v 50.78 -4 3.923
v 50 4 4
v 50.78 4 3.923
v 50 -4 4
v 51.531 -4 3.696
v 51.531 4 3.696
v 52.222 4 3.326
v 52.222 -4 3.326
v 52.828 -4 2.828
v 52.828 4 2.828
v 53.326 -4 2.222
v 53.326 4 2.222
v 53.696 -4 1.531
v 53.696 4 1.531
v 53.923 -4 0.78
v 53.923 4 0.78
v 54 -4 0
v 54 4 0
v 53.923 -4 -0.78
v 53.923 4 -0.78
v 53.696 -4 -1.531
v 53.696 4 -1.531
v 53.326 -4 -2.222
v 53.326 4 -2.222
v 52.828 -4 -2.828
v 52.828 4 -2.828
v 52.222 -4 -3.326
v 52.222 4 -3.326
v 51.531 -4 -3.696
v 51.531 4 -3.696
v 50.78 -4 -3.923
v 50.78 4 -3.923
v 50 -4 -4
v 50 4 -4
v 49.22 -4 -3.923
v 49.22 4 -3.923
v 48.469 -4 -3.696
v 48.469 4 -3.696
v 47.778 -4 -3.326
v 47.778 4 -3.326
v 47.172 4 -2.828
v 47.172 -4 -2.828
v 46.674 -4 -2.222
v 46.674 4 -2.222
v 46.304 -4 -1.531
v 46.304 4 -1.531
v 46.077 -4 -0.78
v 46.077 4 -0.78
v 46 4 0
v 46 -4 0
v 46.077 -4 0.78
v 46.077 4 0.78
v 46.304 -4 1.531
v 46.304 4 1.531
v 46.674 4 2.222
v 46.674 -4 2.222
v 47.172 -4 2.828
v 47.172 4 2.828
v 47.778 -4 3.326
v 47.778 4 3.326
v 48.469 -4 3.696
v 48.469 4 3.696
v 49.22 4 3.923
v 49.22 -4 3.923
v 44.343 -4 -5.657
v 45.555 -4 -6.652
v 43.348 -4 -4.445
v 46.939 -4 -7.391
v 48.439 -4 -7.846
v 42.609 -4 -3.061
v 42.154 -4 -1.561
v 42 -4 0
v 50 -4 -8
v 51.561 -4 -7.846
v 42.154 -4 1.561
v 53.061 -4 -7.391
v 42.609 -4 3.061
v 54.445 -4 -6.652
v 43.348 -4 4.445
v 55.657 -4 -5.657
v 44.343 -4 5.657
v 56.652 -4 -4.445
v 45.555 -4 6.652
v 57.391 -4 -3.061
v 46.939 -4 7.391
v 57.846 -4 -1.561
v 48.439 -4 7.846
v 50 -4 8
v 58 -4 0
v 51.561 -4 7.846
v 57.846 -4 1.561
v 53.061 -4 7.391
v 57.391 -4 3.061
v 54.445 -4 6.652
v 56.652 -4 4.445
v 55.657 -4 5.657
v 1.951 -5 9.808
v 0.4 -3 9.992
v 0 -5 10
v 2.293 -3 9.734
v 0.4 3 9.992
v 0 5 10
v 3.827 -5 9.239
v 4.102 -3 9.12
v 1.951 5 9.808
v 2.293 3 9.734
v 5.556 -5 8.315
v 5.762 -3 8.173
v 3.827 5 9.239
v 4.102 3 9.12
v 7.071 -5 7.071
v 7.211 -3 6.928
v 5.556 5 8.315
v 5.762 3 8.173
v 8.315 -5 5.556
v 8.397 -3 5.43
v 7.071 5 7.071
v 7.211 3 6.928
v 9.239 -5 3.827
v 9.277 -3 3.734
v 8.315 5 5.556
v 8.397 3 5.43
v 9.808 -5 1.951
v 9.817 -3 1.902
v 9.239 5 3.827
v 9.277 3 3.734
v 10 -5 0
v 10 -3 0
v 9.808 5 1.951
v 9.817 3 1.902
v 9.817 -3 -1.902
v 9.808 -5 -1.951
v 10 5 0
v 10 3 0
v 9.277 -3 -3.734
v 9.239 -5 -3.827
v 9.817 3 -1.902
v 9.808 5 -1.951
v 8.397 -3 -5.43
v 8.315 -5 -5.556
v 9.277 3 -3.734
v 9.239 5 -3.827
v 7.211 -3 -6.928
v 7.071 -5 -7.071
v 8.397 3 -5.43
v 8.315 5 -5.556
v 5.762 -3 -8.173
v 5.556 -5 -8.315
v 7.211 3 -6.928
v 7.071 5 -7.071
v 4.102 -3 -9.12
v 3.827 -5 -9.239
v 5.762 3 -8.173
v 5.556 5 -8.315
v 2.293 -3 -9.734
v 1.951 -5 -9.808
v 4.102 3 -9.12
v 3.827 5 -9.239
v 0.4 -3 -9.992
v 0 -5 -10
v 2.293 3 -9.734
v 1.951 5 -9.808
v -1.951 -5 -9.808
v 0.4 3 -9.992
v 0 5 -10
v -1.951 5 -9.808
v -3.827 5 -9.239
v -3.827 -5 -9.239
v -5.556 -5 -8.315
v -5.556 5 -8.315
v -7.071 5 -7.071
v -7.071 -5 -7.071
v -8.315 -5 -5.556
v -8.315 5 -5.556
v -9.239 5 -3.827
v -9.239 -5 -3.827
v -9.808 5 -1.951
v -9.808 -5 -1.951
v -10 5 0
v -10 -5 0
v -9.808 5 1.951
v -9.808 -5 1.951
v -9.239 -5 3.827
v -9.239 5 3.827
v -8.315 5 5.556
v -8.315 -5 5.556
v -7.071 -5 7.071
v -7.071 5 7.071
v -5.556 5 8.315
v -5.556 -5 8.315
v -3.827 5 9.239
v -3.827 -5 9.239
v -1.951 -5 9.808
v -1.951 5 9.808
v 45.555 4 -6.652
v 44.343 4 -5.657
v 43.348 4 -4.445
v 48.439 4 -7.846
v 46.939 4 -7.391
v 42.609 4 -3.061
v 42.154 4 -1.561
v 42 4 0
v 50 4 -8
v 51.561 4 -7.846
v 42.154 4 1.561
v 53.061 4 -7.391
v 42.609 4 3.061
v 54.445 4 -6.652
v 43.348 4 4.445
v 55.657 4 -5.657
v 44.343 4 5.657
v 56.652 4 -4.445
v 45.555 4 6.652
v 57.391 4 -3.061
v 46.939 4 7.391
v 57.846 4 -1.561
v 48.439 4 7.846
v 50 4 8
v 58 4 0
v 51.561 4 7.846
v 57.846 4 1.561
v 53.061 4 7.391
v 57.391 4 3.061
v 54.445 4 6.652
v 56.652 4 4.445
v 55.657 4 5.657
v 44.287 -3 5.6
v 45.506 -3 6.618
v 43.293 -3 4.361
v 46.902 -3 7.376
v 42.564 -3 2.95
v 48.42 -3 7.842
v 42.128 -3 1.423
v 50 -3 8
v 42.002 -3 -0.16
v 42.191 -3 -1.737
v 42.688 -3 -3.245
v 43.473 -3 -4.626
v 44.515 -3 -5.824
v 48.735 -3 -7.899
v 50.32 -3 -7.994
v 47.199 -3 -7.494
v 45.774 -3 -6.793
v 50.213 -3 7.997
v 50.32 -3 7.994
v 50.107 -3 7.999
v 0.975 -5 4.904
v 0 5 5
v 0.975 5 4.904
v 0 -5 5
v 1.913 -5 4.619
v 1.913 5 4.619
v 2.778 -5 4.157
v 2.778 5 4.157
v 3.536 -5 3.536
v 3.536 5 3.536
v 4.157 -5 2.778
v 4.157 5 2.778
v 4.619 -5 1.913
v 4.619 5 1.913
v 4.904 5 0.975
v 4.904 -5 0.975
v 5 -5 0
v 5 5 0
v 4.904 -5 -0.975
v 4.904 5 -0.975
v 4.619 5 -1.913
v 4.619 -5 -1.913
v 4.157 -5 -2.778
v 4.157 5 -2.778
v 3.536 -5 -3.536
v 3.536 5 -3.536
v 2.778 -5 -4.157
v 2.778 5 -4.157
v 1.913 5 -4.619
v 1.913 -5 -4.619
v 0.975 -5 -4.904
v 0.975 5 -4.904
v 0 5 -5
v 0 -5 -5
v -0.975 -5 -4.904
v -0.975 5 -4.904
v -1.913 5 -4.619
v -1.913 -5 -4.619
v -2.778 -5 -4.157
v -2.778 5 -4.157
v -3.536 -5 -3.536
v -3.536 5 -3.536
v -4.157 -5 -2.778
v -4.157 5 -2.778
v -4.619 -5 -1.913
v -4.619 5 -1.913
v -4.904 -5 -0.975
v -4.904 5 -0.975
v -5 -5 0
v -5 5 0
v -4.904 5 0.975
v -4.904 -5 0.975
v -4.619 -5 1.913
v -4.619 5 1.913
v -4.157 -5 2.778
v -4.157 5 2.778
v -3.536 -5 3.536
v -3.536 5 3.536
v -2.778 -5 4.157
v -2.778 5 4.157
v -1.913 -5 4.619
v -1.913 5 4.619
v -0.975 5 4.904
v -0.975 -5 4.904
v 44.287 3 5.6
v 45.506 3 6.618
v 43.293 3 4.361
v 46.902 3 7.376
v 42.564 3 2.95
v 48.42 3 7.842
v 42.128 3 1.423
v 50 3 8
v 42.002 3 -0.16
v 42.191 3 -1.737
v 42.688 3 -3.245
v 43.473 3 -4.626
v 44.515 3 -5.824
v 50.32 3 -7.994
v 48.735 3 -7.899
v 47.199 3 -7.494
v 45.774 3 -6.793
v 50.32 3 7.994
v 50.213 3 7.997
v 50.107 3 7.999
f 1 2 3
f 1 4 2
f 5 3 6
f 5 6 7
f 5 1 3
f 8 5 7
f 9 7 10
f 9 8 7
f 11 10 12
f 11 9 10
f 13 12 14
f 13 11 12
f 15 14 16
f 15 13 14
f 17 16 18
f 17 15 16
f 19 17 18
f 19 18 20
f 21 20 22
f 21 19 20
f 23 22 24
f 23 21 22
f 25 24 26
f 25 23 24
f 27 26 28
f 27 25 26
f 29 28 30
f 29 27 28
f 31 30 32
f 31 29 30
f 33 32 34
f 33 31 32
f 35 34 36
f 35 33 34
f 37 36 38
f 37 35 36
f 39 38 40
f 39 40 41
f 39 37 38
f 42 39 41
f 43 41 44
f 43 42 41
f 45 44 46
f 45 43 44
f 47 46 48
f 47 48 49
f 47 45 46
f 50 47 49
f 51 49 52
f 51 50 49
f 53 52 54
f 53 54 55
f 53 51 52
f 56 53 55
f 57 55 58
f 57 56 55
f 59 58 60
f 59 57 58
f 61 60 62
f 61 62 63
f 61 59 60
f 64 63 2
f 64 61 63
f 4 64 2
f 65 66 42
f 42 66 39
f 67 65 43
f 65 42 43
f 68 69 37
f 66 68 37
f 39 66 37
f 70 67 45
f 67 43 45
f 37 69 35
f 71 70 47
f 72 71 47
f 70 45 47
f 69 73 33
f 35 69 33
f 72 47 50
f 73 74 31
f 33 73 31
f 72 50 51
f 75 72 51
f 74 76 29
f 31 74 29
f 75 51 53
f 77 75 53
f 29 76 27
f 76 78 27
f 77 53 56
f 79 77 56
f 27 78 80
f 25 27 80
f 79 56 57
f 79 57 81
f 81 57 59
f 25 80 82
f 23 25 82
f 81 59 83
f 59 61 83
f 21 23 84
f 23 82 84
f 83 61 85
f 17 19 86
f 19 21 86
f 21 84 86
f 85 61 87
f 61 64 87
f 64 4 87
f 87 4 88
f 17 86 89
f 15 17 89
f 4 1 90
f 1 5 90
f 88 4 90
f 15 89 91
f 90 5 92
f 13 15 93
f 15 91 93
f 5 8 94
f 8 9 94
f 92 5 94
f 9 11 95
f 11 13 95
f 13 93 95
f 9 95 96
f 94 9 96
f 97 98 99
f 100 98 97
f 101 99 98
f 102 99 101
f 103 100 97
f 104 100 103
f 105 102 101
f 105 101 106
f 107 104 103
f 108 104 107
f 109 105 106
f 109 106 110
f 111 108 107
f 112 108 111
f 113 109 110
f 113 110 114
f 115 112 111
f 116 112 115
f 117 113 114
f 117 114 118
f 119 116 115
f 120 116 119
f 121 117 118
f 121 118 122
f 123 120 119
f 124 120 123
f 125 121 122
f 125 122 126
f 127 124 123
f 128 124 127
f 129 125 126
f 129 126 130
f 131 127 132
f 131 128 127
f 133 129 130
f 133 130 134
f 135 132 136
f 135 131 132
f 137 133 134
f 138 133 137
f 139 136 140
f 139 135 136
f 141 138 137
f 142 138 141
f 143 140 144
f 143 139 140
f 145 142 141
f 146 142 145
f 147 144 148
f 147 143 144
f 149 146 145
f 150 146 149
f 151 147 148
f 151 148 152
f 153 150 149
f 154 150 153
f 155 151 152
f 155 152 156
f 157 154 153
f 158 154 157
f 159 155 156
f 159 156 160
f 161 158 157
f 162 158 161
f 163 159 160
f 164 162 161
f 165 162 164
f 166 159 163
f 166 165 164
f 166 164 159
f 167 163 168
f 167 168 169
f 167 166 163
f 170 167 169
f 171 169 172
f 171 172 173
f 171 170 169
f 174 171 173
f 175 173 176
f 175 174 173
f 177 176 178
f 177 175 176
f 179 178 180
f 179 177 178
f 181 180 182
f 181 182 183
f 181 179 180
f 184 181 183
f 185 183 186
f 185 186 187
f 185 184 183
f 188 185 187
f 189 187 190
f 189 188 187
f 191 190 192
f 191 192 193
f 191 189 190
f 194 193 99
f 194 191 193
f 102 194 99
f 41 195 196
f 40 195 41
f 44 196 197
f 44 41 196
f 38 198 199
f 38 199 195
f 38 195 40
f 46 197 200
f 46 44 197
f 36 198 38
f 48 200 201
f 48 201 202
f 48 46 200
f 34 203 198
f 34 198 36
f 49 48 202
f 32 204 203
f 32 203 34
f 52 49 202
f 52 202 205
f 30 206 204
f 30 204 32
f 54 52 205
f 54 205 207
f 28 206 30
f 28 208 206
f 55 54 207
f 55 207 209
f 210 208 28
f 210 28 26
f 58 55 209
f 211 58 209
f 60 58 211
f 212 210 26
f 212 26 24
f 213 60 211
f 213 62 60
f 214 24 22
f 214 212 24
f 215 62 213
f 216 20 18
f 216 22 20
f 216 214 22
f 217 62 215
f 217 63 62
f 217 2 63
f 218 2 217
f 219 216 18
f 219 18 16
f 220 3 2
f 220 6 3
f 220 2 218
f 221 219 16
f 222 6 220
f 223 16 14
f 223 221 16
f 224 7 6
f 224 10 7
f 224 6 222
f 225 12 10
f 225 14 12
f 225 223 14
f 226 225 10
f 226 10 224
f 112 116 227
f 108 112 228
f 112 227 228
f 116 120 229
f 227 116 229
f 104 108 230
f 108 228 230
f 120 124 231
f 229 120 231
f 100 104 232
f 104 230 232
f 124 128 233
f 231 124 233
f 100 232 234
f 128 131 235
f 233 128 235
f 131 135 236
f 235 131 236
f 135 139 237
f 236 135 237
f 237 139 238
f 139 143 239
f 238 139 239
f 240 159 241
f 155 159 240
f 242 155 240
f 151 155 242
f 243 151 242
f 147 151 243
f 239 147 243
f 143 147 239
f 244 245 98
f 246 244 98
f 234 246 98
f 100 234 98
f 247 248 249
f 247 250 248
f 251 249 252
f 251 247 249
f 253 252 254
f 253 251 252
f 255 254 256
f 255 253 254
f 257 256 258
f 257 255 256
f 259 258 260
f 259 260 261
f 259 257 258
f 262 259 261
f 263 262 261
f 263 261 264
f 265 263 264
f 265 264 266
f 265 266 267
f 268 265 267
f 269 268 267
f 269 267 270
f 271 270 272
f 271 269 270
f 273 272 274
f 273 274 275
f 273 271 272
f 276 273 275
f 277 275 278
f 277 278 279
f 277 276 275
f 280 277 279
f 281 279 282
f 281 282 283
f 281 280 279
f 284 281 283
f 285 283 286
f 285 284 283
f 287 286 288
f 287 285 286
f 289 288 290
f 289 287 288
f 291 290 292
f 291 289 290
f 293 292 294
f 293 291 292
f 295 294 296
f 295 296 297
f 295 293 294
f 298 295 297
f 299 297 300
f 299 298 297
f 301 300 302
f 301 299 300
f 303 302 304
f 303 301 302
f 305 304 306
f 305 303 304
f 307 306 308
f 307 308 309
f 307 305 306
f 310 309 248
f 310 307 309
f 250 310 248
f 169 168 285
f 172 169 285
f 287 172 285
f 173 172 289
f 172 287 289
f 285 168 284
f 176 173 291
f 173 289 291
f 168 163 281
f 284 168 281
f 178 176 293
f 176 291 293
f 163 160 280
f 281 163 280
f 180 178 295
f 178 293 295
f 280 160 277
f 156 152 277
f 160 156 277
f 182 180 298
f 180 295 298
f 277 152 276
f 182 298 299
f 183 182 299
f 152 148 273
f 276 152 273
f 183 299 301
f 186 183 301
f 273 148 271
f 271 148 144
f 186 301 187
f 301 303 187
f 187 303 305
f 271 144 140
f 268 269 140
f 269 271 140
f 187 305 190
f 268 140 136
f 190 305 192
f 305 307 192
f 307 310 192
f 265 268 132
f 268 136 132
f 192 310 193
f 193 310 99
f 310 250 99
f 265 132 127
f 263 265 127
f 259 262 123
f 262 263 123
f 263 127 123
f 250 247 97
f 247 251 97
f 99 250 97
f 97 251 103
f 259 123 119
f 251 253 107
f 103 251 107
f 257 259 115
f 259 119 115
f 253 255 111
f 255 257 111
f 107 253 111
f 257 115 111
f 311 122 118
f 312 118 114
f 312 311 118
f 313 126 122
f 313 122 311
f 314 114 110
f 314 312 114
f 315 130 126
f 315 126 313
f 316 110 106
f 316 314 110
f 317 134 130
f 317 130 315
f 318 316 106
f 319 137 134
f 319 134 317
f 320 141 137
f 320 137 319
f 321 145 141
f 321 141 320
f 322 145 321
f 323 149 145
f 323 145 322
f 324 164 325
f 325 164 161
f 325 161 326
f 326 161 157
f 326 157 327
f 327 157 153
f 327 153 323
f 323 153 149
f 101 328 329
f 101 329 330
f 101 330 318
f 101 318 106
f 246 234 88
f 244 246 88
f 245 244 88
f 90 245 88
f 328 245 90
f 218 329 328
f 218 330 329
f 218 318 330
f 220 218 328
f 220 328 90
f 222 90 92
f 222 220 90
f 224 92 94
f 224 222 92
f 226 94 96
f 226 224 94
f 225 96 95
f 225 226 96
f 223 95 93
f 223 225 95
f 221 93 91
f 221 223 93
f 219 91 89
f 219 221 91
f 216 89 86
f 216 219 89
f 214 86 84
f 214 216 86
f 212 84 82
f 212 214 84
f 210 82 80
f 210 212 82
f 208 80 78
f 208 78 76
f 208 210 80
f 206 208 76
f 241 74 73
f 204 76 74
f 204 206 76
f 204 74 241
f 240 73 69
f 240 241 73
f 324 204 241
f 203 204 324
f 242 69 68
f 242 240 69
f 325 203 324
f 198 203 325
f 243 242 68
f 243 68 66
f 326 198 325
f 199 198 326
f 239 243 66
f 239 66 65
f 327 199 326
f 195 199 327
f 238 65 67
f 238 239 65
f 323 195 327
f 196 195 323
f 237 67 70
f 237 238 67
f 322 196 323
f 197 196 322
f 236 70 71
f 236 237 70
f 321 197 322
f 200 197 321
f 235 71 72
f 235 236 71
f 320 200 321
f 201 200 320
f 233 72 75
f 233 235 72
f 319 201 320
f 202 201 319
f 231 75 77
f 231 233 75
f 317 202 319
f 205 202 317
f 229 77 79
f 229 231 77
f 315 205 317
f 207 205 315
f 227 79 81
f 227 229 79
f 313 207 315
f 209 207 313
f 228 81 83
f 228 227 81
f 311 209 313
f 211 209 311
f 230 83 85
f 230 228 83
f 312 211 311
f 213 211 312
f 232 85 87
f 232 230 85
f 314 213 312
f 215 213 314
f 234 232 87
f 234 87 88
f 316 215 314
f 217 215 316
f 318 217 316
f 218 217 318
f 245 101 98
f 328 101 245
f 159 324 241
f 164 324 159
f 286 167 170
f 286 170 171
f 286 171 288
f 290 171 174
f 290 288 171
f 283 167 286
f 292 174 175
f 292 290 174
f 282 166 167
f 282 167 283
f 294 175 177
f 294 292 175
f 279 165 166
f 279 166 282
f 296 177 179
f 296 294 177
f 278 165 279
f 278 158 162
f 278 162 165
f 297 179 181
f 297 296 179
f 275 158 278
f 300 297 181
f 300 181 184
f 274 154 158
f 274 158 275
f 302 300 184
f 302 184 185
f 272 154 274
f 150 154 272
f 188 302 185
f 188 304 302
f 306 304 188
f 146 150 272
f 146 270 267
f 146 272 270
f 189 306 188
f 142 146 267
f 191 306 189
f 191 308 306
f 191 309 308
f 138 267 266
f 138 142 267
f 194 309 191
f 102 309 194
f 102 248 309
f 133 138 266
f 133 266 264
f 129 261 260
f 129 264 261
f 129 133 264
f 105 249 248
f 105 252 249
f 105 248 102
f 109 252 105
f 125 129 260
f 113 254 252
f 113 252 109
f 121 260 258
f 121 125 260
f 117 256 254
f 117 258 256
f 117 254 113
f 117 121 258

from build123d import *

# Parameters (mm, degrees)
AUFSATZ_LINEAR_AUSTRAGEN1_DEPTH = 3
SKIZZE4_3_R                     = 10
SKIZZE4_3_R_2                   = 5
AUFSATZ_LINEAR_AUSTRAGEN2_DEPTH = 5
SKIZZE4_4_R                     = 8
SKIZZE4_4_R_2                   = 4
AUFSATZ_LINEAR_AUSTRAGEN3_DEPTH = 4


with BuildPart() as part:
    # Skizze4 → Aufsatz-Linear austragen1 (new body, symmetric)
    with BuildSketch(Plane(origin=(0, 0, 0), x_dir=(1, 0, 0), z_dir=(0, 1, 0))):
        with BuildLine():
            Line((50.32, 7.993597438), (0.4, 9.991996797))
            ThreePointArc((0.4, 9.991996797), (7.211102551, 6.92820323), (10, 0))
            ThreePointArc((10, 0), (7.211102551, -6.92820323), (0.4, -9.991996797))
            Line((0.4, -9.991996797), (50.32, -7.993597438))
            ThreePointArc((50.32, -7.993597438), (42, 0), (50.32, 7.993597438))
        make_face()
    extrude(amount=AUFSATZ_LINEAR_AUSTRAGEN1_DEPTH, both=True)

    # Skizze4_3 → Aufsatz-Linear austragen2 (add, symmetric)
    with BuildSketch(Plane(origin=(0, 0, 0), x_dir=(1, 0, 0), z_dir=(0, 1, 0))):
        with Locations(Location((0, 0, 0), (0, 0, 270))):  # turned: the seam where the file's is
            Circle(SKIZZE4_3_R)
        with Locations(Location((0, 0, 0), (0, 0, 270))):  # turned: the seam where the file's is
            Circle(SKIZZE4_3_R_2, mode=Mode.SUBTRACT)
    extrude(amount=AUFSATZ_LINEAR_AUSTRAGEN2_DEPTH, both=True)

    # Skizze4_4 → Aufsatz-Linear austragen3 (add, symmetric)
    with BuildSketch(Plane(origin=(0, 0, 0), x_dir=(1, 0, 0), z_dir=(0, 1, 0))):
        with Locations(Location((50, 0, 0), (0, 0, 270))):  # turned: the seam where the file's is
            Circle(SKIZZE4_4_R)
        with Locations(Location((50, 0, 0), (0, 0, 270))):  # turned: the seam where the file's is
            Circle(SKIZZE4_4_R_2, mode=Mode.SUBTRACT)
    extrude(amount=AUFSATZ_LINEAR_AUSTRAGEN3_DEPTH, both=True)


solid = part.part
